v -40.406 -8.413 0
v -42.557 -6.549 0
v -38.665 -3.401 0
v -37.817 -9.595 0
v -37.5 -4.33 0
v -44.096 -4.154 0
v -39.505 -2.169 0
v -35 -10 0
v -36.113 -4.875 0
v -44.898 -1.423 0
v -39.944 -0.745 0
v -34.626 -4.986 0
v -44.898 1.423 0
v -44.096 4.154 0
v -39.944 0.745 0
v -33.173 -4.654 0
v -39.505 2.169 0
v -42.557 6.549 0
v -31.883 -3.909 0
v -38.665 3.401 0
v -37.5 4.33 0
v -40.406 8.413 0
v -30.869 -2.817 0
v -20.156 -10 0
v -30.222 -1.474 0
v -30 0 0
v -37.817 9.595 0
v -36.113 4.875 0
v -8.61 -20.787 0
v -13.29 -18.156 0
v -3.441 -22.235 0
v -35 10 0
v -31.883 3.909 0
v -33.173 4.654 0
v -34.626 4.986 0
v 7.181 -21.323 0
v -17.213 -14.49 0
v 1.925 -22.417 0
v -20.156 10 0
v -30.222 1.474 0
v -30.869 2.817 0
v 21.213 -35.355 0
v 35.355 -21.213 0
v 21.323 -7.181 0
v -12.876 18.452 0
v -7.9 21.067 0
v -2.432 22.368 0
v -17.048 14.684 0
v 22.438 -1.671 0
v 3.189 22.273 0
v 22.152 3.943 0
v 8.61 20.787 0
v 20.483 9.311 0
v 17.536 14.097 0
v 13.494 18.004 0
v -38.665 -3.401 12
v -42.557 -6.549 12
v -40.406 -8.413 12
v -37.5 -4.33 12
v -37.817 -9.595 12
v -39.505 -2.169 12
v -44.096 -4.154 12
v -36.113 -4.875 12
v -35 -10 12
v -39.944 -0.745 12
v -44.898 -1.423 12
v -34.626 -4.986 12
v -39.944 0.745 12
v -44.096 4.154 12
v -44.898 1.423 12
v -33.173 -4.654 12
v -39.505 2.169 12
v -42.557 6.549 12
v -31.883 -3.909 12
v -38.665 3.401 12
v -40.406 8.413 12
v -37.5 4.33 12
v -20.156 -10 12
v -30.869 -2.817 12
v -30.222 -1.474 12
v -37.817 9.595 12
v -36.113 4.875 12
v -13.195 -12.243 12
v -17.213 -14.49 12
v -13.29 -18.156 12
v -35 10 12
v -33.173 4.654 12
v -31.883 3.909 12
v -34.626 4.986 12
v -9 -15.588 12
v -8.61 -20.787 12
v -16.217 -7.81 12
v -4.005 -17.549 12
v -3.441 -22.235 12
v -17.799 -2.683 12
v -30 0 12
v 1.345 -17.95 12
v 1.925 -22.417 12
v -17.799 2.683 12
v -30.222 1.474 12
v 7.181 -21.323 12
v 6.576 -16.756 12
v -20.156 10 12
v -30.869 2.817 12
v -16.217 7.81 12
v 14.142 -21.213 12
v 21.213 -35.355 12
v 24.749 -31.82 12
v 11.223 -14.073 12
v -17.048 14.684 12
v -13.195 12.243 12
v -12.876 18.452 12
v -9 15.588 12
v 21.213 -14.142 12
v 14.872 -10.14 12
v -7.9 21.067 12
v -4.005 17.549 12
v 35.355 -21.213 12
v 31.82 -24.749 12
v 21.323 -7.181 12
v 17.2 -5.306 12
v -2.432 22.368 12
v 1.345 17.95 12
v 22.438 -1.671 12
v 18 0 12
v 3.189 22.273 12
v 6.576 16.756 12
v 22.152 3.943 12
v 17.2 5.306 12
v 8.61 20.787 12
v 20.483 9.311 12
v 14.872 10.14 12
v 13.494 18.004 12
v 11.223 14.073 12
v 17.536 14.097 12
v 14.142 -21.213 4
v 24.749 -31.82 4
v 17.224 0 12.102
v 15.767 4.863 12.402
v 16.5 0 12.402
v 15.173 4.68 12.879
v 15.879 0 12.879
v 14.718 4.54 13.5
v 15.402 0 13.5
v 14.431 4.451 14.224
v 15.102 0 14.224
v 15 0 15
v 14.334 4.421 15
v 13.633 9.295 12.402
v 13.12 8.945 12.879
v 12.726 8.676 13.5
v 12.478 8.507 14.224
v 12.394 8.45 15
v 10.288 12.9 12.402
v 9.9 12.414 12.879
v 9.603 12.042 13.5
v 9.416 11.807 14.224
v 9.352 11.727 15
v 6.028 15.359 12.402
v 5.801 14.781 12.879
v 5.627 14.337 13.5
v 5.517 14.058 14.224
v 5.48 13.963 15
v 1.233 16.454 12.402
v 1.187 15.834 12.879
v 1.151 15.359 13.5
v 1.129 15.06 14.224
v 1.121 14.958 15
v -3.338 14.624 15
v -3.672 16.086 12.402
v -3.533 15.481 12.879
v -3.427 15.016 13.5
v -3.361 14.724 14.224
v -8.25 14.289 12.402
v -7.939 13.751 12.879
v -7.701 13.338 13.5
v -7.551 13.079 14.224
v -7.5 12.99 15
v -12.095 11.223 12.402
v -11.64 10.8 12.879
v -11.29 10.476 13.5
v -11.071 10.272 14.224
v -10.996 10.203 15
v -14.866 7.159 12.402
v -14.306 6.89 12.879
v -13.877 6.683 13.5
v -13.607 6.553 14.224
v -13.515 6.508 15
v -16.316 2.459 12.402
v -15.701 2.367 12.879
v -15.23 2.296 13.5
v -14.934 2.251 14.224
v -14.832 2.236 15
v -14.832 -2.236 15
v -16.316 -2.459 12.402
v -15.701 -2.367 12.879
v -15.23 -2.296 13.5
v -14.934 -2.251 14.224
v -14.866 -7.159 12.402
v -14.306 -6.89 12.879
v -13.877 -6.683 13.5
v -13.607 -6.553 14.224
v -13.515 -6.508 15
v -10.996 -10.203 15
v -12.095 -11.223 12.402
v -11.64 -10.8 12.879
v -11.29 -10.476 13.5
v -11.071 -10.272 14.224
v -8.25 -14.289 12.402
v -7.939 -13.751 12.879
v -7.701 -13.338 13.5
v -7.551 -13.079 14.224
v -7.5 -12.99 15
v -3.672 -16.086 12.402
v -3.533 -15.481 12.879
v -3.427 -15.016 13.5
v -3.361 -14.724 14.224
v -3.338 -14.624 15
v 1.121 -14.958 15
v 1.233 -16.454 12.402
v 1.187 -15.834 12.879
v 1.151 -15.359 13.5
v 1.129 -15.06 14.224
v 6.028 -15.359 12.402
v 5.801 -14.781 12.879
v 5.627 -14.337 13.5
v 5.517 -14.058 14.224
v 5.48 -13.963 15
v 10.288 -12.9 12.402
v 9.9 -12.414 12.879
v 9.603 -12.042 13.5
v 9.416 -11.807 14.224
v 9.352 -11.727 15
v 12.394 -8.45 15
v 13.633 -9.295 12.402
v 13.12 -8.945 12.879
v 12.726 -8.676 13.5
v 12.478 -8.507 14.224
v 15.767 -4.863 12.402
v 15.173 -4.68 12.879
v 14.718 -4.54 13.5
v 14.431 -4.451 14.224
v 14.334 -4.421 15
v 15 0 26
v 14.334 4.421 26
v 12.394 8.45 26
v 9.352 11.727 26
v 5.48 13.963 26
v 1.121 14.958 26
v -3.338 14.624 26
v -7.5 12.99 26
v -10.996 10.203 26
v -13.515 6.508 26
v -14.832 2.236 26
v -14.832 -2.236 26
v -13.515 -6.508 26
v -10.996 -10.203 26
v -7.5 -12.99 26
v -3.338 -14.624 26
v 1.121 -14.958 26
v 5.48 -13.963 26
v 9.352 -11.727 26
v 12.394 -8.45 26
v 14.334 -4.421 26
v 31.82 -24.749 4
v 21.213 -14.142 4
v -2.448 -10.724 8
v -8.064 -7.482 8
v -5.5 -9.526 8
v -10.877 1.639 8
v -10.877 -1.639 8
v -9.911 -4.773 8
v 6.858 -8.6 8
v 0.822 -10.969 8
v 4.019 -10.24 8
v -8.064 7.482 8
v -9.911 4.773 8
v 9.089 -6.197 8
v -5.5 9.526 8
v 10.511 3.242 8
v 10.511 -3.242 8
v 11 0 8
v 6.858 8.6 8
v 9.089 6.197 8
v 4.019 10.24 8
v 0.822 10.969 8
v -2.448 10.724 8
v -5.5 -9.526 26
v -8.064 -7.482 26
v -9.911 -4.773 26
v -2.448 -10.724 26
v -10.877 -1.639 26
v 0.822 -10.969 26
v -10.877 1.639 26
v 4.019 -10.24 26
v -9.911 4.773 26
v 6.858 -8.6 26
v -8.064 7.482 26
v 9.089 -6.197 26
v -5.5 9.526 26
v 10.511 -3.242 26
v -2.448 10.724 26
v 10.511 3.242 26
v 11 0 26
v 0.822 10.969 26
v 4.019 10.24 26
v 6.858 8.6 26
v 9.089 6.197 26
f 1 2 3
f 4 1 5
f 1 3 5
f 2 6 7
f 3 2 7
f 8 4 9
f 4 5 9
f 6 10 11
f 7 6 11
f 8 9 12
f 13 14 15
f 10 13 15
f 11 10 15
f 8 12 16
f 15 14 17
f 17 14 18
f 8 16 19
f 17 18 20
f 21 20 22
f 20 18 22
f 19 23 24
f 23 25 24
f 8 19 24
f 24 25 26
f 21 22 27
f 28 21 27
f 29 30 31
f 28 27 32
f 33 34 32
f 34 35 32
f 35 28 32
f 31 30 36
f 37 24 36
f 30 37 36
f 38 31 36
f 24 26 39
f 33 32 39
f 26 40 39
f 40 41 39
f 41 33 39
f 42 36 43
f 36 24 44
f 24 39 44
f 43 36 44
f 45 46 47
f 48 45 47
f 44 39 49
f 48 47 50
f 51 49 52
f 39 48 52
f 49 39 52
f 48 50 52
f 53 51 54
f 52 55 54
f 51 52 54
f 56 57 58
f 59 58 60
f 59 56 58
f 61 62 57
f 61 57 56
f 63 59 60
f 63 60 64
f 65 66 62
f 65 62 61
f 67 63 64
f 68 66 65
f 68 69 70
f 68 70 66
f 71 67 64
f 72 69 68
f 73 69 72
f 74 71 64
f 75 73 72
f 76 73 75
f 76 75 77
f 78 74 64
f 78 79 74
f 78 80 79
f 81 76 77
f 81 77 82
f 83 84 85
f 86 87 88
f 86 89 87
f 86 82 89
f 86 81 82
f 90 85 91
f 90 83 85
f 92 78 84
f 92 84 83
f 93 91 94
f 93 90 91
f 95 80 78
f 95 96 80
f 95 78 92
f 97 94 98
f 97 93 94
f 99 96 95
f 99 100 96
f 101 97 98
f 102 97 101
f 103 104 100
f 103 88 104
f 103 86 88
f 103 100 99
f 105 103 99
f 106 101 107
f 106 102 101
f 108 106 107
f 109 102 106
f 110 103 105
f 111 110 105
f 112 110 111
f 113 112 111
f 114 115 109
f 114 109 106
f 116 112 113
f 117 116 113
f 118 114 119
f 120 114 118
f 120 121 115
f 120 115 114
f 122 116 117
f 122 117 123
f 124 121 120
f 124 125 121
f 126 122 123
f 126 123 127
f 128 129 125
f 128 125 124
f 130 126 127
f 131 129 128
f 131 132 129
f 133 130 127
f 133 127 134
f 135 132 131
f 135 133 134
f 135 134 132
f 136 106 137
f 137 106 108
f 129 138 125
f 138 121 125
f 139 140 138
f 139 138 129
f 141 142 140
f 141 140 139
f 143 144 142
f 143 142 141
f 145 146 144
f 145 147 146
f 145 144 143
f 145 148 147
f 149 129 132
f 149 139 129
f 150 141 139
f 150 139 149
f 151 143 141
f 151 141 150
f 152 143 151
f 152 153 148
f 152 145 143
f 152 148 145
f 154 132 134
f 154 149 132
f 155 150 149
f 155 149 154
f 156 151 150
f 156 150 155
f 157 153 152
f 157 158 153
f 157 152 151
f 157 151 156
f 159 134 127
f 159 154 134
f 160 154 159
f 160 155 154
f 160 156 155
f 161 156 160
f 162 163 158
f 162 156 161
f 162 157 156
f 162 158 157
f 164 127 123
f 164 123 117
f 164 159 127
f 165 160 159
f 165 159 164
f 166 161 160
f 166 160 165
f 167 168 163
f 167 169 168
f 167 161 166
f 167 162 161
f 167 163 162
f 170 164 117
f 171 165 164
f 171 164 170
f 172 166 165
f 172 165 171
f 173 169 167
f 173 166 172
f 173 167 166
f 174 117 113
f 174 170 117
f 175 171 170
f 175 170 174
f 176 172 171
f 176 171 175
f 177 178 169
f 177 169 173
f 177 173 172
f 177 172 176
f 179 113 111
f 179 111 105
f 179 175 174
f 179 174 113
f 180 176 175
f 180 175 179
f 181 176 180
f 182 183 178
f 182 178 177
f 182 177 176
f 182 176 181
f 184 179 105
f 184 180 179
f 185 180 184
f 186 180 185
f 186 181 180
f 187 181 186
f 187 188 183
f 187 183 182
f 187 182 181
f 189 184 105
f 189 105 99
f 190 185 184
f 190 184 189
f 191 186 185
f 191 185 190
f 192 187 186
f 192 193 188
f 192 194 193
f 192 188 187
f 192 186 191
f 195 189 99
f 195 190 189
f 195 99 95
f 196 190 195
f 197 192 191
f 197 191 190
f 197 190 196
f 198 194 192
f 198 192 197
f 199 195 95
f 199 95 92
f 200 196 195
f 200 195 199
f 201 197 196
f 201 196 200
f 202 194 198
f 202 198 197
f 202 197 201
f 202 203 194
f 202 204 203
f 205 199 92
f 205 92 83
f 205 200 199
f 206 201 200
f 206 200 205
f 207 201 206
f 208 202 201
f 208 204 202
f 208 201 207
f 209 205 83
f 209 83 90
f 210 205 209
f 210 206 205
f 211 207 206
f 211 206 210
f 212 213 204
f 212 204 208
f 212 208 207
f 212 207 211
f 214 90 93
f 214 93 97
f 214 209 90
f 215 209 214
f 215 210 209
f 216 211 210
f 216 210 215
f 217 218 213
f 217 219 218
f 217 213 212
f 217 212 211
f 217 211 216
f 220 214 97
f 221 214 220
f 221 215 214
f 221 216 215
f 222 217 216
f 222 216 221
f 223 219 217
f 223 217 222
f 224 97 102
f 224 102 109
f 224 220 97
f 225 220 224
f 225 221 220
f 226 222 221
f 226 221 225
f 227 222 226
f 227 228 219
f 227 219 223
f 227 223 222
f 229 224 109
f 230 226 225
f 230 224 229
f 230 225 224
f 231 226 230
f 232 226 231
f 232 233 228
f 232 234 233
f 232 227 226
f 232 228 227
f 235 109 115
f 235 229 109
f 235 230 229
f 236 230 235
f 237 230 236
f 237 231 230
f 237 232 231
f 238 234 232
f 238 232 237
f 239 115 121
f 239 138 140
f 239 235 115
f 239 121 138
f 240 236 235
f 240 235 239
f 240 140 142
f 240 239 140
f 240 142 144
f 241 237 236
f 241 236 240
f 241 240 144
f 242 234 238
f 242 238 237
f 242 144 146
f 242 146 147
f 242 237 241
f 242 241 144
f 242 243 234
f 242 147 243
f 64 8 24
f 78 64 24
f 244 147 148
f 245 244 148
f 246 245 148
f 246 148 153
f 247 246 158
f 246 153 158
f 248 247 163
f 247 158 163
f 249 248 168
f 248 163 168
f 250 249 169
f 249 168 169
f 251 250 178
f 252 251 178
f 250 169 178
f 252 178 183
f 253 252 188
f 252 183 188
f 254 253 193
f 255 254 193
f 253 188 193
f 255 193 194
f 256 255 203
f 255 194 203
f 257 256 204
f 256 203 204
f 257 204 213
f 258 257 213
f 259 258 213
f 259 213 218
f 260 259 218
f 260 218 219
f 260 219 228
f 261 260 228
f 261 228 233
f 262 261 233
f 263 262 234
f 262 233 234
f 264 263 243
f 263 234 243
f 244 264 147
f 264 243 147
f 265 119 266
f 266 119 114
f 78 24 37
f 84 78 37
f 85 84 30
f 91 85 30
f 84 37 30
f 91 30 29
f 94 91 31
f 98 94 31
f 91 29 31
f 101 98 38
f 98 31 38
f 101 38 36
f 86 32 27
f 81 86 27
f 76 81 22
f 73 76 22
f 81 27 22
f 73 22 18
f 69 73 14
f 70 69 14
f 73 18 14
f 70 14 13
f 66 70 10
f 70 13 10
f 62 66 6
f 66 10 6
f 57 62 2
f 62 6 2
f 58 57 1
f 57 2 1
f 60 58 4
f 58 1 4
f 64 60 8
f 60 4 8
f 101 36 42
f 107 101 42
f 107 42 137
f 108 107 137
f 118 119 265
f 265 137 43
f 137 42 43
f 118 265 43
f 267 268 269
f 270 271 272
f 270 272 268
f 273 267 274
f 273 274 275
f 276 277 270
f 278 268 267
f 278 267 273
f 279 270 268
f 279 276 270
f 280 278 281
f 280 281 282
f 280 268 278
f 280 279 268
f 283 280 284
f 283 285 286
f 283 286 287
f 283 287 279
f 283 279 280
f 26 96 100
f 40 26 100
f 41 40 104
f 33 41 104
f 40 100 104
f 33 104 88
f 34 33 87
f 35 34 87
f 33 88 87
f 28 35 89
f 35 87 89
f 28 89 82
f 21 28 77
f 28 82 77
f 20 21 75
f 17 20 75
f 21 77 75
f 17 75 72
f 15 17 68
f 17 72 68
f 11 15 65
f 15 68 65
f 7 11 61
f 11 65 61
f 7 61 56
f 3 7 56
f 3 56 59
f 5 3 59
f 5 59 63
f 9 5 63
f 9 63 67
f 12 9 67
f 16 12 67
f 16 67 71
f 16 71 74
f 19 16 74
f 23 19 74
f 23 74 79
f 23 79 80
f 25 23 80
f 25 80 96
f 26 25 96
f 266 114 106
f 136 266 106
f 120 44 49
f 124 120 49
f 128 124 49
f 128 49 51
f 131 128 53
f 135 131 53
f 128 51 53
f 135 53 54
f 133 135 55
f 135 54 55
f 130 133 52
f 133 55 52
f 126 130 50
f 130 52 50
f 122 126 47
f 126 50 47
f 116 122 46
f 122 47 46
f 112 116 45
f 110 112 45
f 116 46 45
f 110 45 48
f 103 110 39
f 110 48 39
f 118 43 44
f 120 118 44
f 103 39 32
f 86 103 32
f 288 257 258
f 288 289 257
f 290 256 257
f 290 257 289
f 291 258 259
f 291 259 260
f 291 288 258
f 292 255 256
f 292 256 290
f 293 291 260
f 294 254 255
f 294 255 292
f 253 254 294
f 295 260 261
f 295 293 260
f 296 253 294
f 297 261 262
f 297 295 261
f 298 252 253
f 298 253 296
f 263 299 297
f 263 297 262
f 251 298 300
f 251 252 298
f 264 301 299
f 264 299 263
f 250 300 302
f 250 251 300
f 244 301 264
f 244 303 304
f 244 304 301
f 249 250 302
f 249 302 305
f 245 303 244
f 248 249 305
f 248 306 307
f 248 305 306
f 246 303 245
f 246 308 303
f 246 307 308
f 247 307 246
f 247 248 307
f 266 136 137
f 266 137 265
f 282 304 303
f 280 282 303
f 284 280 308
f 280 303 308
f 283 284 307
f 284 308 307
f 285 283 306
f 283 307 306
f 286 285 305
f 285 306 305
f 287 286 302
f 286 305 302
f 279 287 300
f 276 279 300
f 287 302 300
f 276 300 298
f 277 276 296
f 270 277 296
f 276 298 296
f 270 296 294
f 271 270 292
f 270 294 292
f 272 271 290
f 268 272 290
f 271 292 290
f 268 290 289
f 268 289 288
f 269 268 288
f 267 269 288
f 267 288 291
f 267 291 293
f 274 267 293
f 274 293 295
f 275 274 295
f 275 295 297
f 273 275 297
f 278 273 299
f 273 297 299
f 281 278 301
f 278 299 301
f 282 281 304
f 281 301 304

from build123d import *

# Parameters (mm, degrees)
SALIENTE_EXTRUIR1_DEPTH = 12
CROQUIS4_R              = 15
SALIENTE_EXTRUIR2_DEPTH = 14
CROQUIS5_R              = 11
CORTAR_EXTRUIR3_DEPTH   = 18
REDONDEO1_R             = 3
CORTAR_EXTRUIR4_DEPTH   = 8
CORTAR_EXTRUIR6_REACH   = 60.915
CROQUIS2_R              = 5


with BuildPart() as part:
    # Croquis1 → Saliente-Extruir1 (new body)
    with BuildSketch(Plane.XY):
        with BuildLine():
            Line((7.181125002, -21.323260626), (21.213203436, -35.355339059))
            Line((21.213203436, -35.355339059), (35.355339059, -21.213203436))
            Line((35.355339059, -21.213203436), (21.323260626, -7.181125002))
            ThreePointArc((21.323260626, -7.181125002), (8.610377228, 20.787289482), (-20.155644371, 10))
            Line((-20.155644371, 10), (-35, 10))
            ThreePointArc((-35, 10), (-45, 0), (-35, -10))
            Line((-35, -10), (-20.155644371, -10))
            ThreePointArc((-20.155644371, -10), (-8.610377228, -20.787289482), (7.181125002, -21.323260626))
        make_face()
    extrude(amount=SALIENTE_EXTRUIR1_DEPTH)

    # Croquis4 → Saliente-Extruir2 (add)
    with BuildSketch(Plane.XY.offset(12)):
        Circle(CROQUIS4_R)
    extrude(amount=SALIENTE_EXTRUIR2_DEPTH)

    # Croquis5 → Cortar-Extruir3 (cut)
    with BuildSketch(Plane.XY.offset(26)):
        Circle(CROQUIS5_R)
    extrude(amount=-CORTAR_EXTRUIR3_DEPTH, mode=Mode.SUBTRACT)

    # Redondeo1
    redondeo1_edges = [part.edges().sort_by_distance(p)[0] for p in [
        (-15, 0, 12),
    ]]
    fillet(redondeo1_edges, radius=REDONDEO1_R)

    # Croquis3 → Cortar-Extruir4 (cut)
    with BuildSketch(Plane.XY.offset(12)):
        Polygon((31.819805153, -24.748737342), (21.213203436, -14.142135624), (14.142135624, -21.213203436), (24.748737342, -31.819805153), align=None)
    extrude(amount=-CORTAR_EXTRUIR4_DEPTH, mode=Mode.SUBTRACT)

    # Croquis2 → Cortar-Extruir6 (cut, up to next)
    with BuildSketch(Plane.XY.offset(12), mode=Mode.PRIVATE) as cortar_extruir6_sk1:
        with Locations((-35, 0)):
            Circle(CROQUIS2_R)
    cortar_extruir6_tool1 = extrude(cortar_extruir6_sk1.sketch, amount=-CORTAR_EXTRUIR6_REACH, mode=Mode.PRIVATE) & part.part
    add(cortar_extruir6_tool1.solids().sort_by_distance((-35, 0, 12))[0], mode=Mode.SUBTRACT)


solid = part.part
